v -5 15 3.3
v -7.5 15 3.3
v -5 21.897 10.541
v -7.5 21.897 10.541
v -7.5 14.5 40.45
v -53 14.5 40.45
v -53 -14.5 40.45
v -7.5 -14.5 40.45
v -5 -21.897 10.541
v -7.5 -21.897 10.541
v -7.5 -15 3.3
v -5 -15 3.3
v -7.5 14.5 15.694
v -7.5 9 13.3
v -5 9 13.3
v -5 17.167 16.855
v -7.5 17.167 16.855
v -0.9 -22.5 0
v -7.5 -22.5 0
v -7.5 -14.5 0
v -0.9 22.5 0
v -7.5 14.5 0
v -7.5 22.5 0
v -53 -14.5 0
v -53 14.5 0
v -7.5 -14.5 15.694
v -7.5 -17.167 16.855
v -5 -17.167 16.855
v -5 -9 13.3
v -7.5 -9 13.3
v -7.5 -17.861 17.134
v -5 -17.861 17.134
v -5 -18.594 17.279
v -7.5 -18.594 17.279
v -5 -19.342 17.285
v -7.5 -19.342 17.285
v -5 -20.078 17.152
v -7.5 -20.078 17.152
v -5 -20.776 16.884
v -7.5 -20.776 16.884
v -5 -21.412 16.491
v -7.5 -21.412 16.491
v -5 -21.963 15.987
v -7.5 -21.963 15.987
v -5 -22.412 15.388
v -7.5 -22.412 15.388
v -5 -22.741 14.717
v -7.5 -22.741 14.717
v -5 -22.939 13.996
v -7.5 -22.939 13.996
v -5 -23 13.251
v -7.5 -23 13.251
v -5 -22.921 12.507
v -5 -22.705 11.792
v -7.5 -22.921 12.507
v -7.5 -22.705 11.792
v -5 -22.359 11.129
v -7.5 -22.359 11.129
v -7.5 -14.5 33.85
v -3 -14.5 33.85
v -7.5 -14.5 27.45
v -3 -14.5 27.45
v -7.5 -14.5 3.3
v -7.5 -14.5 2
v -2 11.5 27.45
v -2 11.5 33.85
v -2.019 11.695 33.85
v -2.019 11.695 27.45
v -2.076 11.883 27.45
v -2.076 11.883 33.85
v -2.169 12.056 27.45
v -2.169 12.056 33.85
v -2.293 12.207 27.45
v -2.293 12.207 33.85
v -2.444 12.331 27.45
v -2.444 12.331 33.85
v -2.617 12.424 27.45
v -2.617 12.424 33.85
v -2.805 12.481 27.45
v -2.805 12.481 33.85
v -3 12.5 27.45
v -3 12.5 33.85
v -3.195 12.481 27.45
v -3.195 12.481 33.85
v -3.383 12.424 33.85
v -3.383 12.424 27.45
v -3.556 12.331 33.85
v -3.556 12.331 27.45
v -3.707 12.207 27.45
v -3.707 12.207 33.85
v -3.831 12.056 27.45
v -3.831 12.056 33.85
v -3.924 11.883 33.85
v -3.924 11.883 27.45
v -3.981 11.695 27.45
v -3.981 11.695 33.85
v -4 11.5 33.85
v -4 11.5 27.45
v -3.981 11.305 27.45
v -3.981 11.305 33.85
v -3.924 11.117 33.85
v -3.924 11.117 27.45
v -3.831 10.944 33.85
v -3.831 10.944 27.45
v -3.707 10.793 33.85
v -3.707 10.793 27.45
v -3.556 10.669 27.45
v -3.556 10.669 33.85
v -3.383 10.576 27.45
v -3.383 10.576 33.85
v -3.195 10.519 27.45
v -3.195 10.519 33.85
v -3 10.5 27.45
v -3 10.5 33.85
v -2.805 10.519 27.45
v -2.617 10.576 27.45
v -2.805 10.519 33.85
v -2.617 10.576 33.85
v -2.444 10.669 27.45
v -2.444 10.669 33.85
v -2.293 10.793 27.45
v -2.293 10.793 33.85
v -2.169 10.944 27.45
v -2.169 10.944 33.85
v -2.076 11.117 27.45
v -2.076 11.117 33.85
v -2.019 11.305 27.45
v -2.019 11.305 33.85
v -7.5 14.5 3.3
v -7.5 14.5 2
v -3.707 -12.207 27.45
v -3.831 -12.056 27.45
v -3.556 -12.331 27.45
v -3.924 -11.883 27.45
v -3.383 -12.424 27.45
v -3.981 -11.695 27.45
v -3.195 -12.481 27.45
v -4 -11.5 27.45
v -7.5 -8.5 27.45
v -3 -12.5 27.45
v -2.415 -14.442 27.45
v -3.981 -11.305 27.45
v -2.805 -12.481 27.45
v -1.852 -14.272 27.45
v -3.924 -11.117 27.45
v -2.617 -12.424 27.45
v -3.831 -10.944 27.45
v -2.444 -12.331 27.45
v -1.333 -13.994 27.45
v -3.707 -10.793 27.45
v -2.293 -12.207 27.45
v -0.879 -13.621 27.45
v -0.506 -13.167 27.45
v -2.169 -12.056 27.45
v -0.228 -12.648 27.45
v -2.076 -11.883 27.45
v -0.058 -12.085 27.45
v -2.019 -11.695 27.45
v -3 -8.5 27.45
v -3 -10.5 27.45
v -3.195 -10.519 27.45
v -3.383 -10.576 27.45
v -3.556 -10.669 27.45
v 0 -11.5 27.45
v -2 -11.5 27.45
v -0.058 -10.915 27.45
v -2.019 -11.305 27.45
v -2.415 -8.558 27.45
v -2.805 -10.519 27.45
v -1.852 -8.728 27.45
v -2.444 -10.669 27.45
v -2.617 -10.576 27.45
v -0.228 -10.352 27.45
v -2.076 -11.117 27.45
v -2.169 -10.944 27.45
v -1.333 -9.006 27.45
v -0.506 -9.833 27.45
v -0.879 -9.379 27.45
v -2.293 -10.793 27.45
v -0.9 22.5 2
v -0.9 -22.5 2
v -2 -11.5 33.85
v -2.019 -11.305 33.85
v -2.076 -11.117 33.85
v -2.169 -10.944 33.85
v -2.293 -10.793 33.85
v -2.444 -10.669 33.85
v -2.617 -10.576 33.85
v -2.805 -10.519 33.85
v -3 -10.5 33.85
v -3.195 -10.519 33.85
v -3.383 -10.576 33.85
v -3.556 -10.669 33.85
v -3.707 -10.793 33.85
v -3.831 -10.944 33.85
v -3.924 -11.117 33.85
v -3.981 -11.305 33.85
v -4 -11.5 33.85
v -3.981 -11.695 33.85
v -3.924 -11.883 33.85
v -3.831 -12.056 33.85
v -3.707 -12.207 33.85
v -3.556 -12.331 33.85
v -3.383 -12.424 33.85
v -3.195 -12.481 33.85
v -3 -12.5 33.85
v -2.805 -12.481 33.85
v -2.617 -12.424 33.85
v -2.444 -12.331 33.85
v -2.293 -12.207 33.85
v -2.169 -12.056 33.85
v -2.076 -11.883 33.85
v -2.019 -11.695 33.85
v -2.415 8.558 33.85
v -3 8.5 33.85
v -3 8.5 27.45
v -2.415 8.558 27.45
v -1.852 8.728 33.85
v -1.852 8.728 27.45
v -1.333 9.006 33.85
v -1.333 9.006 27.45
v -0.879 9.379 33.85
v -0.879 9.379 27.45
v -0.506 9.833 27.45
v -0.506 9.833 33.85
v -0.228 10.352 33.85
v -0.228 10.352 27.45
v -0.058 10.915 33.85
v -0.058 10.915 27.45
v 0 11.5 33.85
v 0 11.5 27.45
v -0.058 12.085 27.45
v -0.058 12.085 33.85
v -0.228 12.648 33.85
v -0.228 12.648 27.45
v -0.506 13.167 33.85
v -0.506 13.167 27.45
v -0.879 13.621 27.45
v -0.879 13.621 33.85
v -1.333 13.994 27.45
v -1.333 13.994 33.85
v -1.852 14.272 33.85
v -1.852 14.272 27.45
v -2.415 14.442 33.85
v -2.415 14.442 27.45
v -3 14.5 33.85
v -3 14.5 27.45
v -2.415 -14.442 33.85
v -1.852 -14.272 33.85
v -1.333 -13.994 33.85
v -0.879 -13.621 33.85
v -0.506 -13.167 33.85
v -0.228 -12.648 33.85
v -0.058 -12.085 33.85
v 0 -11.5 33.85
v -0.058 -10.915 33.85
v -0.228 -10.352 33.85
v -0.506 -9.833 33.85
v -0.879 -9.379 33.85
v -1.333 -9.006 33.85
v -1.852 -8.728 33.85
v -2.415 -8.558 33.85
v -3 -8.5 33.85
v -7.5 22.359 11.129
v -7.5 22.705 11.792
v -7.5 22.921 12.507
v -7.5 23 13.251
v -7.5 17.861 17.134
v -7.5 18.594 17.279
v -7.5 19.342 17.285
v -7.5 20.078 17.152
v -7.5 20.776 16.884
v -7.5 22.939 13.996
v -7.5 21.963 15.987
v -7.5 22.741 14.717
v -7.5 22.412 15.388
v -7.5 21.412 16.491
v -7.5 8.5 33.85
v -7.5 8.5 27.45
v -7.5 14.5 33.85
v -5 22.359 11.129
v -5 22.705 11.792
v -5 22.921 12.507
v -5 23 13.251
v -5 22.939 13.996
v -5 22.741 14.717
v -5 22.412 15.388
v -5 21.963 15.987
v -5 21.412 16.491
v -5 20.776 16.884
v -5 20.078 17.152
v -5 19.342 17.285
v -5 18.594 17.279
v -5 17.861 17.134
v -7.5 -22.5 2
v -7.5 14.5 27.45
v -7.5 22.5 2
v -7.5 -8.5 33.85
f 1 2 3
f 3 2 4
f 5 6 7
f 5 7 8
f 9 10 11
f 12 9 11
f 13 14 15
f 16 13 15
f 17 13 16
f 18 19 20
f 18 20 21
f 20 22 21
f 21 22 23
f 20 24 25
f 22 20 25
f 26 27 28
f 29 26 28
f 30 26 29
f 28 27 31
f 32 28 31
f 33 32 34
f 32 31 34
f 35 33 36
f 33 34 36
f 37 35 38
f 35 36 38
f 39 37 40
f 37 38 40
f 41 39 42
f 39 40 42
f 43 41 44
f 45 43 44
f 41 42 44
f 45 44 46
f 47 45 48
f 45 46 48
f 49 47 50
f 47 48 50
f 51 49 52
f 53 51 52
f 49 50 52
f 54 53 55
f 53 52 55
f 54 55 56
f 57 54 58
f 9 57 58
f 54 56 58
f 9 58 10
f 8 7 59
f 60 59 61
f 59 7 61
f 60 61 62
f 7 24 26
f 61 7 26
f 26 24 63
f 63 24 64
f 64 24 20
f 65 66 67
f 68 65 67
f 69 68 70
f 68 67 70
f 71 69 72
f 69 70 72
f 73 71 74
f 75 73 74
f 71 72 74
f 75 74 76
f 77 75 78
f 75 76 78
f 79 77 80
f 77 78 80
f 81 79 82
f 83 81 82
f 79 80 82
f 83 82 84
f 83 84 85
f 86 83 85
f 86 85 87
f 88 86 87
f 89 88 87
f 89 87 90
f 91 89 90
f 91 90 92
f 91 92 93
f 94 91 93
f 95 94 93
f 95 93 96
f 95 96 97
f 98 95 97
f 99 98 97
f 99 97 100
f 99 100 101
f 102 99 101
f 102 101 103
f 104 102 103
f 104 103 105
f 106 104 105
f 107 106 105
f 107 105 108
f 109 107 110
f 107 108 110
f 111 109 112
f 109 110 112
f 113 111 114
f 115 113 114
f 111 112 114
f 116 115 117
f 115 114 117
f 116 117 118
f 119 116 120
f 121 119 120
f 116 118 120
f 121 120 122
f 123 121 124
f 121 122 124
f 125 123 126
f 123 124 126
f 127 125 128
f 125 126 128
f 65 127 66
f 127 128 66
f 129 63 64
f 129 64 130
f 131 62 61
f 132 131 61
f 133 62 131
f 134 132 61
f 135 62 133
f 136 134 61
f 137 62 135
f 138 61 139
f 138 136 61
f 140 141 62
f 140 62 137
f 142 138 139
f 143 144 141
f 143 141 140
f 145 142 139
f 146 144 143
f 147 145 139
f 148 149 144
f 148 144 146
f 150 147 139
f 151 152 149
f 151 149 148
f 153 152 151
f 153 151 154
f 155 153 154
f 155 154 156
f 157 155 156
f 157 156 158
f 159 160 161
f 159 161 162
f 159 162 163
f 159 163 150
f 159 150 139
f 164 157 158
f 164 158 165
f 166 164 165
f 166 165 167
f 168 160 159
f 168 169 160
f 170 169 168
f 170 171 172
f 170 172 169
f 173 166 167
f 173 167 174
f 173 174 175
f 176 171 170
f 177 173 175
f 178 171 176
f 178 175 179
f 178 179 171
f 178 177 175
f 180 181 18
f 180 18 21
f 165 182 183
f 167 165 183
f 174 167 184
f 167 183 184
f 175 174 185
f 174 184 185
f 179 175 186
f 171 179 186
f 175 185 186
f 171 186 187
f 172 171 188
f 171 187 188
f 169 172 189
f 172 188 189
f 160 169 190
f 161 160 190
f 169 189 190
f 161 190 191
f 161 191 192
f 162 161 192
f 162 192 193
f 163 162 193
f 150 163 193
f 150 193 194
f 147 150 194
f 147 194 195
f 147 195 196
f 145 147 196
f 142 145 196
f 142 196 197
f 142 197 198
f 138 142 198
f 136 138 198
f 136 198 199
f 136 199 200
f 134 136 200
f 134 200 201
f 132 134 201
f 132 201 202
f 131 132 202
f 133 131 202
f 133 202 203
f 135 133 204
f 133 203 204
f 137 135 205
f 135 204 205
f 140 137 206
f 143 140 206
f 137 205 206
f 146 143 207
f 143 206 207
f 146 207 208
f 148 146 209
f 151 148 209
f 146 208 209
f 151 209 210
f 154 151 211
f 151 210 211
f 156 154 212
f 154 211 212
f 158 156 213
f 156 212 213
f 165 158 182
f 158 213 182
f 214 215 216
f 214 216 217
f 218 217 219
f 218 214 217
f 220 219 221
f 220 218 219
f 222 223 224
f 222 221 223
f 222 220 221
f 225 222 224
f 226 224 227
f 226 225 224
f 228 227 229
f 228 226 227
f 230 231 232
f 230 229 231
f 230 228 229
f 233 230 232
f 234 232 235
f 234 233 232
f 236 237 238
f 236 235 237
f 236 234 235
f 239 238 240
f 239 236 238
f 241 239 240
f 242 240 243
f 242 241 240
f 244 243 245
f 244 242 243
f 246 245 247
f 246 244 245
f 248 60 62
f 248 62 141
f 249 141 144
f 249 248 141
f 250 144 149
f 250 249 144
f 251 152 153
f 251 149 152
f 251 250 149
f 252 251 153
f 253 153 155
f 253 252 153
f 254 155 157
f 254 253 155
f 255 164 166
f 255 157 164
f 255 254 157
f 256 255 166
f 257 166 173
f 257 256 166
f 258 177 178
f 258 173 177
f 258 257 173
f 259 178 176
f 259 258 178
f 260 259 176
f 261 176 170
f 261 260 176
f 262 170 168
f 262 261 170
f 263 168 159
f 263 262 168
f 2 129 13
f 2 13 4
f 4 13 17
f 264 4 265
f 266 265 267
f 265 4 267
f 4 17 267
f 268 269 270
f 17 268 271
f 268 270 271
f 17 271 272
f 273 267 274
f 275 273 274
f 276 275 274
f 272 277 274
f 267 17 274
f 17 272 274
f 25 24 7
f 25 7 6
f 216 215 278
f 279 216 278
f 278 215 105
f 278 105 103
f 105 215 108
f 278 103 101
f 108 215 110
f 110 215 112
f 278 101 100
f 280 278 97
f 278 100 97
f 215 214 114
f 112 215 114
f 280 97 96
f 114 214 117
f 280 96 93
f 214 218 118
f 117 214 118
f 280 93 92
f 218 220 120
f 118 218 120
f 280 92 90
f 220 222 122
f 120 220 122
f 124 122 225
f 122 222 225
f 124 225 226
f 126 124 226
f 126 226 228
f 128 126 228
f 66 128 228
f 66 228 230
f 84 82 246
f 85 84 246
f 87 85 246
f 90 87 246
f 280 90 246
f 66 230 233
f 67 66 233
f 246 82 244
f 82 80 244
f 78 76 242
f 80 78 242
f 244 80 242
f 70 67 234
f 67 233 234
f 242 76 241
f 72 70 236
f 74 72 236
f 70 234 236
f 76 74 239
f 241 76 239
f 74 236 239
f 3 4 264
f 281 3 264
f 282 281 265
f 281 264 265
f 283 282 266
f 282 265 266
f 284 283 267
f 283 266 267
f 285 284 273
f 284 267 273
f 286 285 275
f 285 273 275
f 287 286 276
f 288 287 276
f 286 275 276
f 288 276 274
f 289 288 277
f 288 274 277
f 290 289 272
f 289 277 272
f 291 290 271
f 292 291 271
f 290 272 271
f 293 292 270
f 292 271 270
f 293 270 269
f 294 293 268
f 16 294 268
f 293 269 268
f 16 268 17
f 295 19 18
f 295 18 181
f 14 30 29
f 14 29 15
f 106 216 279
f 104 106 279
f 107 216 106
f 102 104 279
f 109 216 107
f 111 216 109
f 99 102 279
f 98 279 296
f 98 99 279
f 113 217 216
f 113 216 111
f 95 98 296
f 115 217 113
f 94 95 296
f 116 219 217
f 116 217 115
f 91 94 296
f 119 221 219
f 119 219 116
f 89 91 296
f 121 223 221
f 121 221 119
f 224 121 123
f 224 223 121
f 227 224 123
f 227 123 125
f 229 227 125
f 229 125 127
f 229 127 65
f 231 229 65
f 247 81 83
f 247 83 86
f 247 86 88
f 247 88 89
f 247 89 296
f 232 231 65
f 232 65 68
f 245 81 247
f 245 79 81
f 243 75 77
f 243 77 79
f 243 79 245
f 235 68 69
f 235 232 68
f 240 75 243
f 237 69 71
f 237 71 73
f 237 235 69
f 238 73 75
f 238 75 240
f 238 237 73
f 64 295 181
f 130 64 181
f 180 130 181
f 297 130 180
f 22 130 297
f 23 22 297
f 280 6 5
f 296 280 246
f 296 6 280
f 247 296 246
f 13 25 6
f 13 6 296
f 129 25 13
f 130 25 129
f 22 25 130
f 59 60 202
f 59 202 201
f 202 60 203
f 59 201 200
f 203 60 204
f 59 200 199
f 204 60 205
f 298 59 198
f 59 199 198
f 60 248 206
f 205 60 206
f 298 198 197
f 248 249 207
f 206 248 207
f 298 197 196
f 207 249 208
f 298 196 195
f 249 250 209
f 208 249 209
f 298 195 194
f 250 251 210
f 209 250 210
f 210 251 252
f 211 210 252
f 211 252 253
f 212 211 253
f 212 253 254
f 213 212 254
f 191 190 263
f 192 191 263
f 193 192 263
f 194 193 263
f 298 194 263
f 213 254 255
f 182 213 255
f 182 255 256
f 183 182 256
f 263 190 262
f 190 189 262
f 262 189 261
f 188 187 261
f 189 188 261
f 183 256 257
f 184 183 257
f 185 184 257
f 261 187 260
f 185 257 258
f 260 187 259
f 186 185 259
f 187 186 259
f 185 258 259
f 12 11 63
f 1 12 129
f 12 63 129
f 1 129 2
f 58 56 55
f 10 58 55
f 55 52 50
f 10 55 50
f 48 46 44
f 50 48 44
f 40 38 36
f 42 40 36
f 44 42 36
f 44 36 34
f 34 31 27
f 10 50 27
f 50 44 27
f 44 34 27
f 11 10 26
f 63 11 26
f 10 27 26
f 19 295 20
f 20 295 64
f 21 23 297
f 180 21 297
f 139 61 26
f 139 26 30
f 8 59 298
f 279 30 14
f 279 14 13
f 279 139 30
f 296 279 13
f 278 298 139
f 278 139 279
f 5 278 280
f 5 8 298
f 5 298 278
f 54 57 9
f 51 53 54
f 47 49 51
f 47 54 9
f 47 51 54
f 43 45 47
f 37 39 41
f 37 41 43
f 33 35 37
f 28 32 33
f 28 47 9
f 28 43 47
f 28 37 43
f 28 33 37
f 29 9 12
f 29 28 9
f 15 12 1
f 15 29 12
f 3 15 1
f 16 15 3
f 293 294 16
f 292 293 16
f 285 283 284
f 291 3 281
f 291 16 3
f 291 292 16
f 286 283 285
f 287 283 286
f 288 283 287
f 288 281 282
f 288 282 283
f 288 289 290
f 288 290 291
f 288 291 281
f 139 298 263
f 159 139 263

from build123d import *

# Parameters (mm, degrees)
SKETCH_W        = 53
SKETCH_H        = 29
PAD_DEPTH       = 40.45
SKETCH001_W     = 29
SKETCH001_H     = 6.6
SKETCH001_H_2   = 27.45
POCKET_DEPTH    = 7.5
SKETCH002_R     = 1
POCKET001_DEPTH = 6.5
PAD001_DEPTH    = 2.5
SKETCH004_W     = 45
SKETCH004_H     = 2
PAD002_DEPTH    = 6.6


with BuildPart() as part:
    # Sketch → Pad (new body)
    with BuildSketch(Plane.XY):
        with Locations((-26.5, 0)):
            Rectangle(SKETCH_W, SKETCH_H)
    extrude(amount=PAD_DEPTH)

    # Sketch001 → Pocket (cut)
    with BuildSketch(Plane.YZ):
        with Locations((0, 37.15)):
            Rectangle(SKETCH001_W, SKETCH001_H)
        with Locations((0, 13.725)):
            Rectangle(SKETCH001_W, SKETCH001_H_2)
    extrude(amount=-POCKET_DEPTH, mode=Mode.SUBTRACT)

    # Sketch002 → Pocket001 (cut)
    with BuildSketch(Plane.XY.offset(33.85)):
        with Locations((-3, -11.5)):
            Circle(SKETCH002_R)
        with Locations((-3, 11.5)):
            Circle(SKETCH002_R)
        with BuildLine():
            Line((-3, 8.5), (-7.5, 8.5))
            Line((-7.5, 8.5), (-7.5, -8.5))
            Line((-7.5, -8.5), (-3, -8.5))
            ThreePointArc((-3, -14.5), (0, -11.5), (-3, -8.5))
            Line((-3, -14.5), (2, -14.5))
            Line((2, -14.5), (2, 14.5))
            Line((2, 14.5), (-3, 14.5))
            ThreePointArc((-3, 8.5), (0, 11.5), (-3, 14.5))
        make_face()
    extrude(amount=-POCKET001_DEPTH, mode=Mode.SUBTRACT)

    # Sketch003 → Pad001 (new body)
    with BuildSketch(Plane.YZ.offset(-7.5)):
        with BuildLine():
            Line((-21.896552, 10.541379), (-15, 3.3))
            Line((-15, 3.3), (15, 3.3))
            Line((15, 3.3), (21.896552, 10.541379))
            ThreePointArc((21.896552, 10.541379), (22.201473, 15.698034), (17.167124, 16.855357))
            Line((9, 13.3), (17.167124, 16.855357))
            Line((-9, 13.3), (9, 13.3))
            Line((-17.167124, 16.855357), (-9, 13.3))
            ThreePointArc((-17.167124, 16.855357), (-22.201473, 15.698034), (-21.896552, 10.541379))
        make_face()
    extrude(amount=PAD001_DEPTH)

    # Sketch004 → Pad002 (new body)
    with BuildSketch(Plane.YZ.offset(-7.5)):
        with Locations((0, 1)):
            Rectangle(SKETCH004_W, SKETCH004_H)
    extrude(amount=PAD002_DEPTH)


solid = part.part
